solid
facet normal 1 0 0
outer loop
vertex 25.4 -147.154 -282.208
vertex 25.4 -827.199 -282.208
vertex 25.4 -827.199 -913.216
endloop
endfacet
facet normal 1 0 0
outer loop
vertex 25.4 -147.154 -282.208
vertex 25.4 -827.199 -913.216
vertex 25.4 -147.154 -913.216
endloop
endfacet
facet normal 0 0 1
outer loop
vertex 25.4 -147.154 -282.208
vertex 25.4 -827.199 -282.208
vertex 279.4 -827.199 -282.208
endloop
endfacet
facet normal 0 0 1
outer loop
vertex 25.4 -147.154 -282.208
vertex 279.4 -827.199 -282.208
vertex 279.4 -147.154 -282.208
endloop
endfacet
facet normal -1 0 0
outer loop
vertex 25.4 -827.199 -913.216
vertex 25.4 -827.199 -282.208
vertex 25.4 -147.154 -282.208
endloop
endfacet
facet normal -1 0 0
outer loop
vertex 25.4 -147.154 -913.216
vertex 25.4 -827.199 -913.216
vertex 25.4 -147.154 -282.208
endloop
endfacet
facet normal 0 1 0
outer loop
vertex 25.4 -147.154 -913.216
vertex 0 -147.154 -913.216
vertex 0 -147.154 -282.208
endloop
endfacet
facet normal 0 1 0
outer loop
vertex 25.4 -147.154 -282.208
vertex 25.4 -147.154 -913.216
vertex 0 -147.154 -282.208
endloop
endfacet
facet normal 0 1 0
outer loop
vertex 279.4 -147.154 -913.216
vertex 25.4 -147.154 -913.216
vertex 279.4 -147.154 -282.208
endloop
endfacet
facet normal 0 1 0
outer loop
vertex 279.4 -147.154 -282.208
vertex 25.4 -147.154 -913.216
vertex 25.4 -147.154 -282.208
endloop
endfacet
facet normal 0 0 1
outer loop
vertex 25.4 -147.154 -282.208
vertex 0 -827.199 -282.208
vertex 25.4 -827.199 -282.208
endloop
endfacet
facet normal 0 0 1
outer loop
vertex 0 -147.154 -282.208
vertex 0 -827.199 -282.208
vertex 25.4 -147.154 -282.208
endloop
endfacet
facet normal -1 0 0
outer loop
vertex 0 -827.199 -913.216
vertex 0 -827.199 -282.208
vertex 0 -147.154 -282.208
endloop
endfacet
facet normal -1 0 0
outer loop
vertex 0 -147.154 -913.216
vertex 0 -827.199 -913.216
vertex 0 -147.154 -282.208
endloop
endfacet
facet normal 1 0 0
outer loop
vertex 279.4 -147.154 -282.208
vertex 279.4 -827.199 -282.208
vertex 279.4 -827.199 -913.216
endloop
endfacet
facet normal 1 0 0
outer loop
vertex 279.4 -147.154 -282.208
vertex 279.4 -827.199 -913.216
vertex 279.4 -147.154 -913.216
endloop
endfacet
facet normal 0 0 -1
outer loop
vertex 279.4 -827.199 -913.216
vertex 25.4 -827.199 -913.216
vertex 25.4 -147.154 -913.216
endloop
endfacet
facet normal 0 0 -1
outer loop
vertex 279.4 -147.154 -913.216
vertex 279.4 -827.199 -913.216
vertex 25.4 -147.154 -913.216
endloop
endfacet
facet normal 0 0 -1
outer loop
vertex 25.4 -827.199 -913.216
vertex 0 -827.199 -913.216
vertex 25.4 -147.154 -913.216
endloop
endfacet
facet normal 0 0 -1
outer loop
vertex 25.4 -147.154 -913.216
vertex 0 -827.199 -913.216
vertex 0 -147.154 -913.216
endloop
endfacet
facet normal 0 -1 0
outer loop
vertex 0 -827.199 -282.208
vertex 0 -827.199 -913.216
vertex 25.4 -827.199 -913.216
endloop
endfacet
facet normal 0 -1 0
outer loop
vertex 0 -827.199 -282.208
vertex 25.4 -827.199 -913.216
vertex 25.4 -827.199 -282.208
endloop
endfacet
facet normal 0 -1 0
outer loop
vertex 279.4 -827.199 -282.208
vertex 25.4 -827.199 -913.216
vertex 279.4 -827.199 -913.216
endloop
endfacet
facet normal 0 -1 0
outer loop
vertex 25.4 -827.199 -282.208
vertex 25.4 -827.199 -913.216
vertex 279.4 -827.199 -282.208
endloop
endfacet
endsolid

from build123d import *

# Parameters (mm, degrees)
F0_W      = 680.044666
F0_H      = 631.007761
F1_DEPTH  = 25.4
F1_FACE_W = 680.044666
F1_FACE_H = 631.00776
F2_DEPTH  = 254


with BuildPart() as f1:
    # F0 (on Right) → F1 (new body)
    with BuildSketch(Plane.YZ):
        with Locations((-487.176411, -597.711756)):
            Rectangle(F0_W, F0_H)
    extrude(amount=F1_DEPTH)


with BuildPart() as f2:
    # F1_face (on face) → F2 (new body)
    with BuildSketch(Plane(origin=(25.4, -487.176411, -597.711757), x_dir=(0, 1, 0), z_dir=(1, 0, 0))):
        Rectangle(F1_FACE_W, F1_FACE_H)
    extrude(amount=F2_DEPTH)


solid = Compound([f1.part, f2.part])
